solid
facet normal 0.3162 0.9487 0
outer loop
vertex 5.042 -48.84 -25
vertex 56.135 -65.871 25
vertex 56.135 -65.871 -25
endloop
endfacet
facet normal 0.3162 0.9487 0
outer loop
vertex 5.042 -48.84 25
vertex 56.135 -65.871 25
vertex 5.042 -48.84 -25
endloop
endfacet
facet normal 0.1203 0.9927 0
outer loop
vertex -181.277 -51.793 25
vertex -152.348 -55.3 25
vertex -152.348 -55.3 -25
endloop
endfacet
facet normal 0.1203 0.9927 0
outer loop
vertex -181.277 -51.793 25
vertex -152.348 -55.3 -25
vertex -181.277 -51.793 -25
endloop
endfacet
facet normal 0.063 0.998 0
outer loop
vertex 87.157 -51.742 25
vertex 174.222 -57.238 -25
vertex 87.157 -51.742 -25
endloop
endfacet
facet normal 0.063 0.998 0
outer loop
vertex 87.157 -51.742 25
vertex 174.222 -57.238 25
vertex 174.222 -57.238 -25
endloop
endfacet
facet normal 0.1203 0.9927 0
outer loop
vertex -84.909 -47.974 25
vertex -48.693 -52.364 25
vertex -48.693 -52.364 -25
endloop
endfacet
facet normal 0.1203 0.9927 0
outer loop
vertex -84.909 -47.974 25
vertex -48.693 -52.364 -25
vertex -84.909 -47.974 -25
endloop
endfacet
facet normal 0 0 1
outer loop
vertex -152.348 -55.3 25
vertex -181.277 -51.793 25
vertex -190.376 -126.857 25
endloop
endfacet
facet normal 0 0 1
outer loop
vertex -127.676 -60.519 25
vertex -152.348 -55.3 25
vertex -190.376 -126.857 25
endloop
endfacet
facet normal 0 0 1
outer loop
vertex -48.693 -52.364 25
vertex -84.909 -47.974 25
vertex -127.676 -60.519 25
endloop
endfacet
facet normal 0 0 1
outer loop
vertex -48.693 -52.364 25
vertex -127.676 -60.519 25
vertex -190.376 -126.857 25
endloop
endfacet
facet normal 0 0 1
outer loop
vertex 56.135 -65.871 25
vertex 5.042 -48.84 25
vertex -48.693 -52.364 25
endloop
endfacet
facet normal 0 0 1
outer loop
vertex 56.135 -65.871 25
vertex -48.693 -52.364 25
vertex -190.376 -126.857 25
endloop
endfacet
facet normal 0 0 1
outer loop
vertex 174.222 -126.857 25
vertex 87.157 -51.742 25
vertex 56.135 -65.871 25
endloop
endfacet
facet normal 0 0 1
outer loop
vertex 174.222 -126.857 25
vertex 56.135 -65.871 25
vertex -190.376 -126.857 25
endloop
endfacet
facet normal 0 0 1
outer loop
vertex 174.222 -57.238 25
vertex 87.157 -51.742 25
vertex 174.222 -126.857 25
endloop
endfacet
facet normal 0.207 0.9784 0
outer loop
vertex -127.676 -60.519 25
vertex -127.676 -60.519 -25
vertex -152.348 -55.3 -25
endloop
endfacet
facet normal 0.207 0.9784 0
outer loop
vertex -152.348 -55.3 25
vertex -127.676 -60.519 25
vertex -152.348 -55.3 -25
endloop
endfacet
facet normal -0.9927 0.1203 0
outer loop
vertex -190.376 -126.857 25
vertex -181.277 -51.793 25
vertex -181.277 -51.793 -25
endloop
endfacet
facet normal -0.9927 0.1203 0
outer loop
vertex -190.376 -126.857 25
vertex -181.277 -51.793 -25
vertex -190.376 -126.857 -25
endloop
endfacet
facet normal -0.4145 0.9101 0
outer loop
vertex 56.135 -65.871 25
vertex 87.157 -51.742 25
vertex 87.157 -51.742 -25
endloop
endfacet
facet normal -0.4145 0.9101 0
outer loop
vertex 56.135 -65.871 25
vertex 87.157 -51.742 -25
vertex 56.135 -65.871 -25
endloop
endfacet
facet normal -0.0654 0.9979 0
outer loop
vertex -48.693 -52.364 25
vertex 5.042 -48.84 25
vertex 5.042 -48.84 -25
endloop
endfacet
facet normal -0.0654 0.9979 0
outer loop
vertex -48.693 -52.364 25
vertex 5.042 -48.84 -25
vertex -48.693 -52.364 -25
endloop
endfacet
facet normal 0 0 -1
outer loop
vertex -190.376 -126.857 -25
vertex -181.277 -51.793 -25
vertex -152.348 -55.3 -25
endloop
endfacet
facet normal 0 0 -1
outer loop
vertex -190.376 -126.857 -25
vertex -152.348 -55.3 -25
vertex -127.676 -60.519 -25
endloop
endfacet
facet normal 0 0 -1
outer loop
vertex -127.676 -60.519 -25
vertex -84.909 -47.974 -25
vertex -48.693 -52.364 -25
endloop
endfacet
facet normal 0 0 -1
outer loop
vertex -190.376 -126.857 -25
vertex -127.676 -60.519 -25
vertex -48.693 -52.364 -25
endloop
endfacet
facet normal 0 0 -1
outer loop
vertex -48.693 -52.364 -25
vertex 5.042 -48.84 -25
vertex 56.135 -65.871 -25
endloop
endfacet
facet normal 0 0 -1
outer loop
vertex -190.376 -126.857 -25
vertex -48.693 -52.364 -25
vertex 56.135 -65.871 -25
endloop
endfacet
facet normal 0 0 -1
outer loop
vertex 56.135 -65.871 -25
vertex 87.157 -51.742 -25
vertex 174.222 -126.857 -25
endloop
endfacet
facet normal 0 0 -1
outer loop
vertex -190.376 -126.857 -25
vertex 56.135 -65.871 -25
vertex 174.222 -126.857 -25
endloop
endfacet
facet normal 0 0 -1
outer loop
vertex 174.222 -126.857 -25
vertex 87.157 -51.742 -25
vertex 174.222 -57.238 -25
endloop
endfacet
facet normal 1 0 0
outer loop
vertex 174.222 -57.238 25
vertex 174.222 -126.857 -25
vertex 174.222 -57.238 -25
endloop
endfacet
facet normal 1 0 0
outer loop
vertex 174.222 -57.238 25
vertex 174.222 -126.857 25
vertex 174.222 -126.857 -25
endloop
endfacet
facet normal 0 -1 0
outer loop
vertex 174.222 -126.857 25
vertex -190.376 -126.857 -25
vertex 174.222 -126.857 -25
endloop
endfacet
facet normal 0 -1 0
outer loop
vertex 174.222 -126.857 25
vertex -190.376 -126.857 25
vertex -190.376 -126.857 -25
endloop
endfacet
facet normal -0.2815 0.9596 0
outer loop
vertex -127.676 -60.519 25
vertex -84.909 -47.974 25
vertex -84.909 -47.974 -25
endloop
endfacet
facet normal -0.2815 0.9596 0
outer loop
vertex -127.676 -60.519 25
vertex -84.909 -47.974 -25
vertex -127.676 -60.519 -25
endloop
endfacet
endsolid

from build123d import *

# Parameters (mm, degrees)
BOSS_EXTRUDE1_DEPTH = 25


with BuildPart() as part:
    # Sketch1 → Boss-Extrude1 (new, symmetric)
    with BuildSketch(Plane.XY):
        Polygon((174.222136922, -57.238128372), (87.15683818, -51.742312172), (56.135286368, -65.87093973), (5.042318242, -48.839950355), (-48.693389614, -52.363603329), (-84.909116911, -47.973818202), (-127.676365392, -60.518877757), (-152.347514605, -55.299980807), (-181.277343289, -51.793334906), (-190.375943184, -126.856784041), (174.222136922, -126.856784041), align=None)
    extrude(amount=BOSS_EXTRUDE1_DEPTH, both=True)


solid = part.part
